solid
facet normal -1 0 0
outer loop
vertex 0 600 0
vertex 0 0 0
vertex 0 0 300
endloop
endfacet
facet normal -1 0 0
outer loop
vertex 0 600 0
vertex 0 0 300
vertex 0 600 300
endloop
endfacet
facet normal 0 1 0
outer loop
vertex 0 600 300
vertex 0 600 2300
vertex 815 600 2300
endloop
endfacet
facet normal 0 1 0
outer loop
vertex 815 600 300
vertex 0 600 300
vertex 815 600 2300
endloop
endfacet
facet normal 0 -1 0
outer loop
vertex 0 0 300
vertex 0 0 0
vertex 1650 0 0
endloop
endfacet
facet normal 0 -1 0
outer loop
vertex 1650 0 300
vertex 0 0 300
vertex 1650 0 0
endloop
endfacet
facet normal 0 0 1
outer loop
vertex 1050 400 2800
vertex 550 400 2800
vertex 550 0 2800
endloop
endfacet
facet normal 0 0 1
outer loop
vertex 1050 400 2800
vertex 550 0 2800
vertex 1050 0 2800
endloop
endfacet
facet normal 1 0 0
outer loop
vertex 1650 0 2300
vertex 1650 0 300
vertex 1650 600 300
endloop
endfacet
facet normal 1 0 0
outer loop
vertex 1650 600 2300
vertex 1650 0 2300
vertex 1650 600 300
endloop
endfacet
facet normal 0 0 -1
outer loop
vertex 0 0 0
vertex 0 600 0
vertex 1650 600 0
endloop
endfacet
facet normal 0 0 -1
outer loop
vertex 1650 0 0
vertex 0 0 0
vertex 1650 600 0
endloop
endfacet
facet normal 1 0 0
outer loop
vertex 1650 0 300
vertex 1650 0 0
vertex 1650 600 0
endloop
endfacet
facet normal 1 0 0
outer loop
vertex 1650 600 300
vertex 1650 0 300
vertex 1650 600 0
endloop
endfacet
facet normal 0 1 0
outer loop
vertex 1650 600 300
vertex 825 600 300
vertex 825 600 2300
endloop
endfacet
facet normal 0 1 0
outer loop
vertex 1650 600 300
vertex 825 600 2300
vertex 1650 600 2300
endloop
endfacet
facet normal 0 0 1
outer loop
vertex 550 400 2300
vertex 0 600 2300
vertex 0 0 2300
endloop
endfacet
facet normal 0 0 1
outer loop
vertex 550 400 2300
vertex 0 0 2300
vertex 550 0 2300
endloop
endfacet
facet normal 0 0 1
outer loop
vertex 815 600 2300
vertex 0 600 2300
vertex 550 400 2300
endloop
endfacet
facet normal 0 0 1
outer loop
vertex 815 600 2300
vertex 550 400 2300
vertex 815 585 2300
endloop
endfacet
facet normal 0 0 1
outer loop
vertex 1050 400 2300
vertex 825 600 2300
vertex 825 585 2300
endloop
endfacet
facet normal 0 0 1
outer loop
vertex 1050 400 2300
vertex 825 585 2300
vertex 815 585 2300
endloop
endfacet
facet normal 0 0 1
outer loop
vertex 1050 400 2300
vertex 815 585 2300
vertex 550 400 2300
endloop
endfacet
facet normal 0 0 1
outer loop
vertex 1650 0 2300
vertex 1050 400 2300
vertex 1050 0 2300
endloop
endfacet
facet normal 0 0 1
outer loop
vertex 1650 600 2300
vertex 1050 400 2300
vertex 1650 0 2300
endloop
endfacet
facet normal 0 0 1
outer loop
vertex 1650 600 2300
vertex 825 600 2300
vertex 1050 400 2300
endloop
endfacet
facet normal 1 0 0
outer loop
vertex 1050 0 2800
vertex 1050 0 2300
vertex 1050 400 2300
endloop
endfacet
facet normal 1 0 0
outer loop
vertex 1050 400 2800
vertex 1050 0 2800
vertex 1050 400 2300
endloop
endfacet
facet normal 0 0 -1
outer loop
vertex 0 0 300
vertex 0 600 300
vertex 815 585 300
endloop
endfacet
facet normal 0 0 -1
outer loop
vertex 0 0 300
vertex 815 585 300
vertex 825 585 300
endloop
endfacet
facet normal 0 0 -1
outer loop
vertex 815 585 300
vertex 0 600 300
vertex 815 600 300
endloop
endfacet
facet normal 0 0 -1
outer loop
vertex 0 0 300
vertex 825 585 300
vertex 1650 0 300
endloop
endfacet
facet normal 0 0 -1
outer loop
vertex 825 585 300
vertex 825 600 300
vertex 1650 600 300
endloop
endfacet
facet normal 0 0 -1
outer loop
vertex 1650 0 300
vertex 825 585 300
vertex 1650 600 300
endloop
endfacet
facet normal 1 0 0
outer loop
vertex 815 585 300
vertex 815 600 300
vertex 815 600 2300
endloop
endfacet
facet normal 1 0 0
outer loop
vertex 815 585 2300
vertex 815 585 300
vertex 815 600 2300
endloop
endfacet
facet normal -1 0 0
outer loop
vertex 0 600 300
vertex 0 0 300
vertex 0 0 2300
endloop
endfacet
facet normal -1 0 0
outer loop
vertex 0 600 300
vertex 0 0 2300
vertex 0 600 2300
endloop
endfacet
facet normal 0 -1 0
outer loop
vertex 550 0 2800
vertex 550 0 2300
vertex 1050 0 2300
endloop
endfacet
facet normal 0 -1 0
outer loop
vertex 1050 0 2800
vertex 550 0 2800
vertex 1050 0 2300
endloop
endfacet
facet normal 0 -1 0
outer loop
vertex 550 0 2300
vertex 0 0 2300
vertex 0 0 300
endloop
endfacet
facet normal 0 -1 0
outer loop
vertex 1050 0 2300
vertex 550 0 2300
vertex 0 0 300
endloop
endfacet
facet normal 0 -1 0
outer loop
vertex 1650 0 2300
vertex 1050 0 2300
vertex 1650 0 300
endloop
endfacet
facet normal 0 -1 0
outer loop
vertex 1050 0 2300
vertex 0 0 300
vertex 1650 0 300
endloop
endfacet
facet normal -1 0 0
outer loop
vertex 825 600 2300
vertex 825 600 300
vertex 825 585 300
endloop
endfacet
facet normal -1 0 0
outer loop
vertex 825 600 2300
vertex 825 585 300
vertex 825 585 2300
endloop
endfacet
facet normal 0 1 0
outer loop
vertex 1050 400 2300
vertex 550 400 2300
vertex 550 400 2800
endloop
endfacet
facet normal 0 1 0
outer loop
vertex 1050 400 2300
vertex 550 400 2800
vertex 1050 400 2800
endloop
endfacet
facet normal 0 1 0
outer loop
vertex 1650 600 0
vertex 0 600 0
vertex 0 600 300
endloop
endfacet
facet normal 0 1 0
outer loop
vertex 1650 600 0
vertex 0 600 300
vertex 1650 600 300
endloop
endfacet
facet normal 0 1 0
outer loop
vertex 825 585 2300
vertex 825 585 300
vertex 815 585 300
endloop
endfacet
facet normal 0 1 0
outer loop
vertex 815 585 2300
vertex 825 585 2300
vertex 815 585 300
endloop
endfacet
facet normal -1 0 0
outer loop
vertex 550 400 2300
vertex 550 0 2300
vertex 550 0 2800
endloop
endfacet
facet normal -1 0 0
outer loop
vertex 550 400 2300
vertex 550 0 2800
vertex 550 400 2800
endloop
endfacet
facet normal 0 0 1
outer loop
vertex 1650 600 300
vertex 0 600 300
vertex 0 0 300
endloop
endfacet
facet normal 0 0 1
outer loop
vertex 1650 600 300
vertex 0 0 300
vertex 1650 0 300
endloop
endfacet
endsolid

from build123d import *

# Parameters (mm, degrees)
F0_W     = 1650
F0_H     = 600
F1_DEPTH = 300
F2_W     = 1650
F2_H     = 600
F3_DEPTH = 2000
F4_W     = 10
F4_H     = 2000
F5_DEPTH = 15
F6_W     = 500
F6_H     = 400
F7_DEPTH = 500


with BuildPart() as f1:
    # F0 (on Top) → F1 (new body)
    with BuildSketch(Plane.XY):
        with Locations((825, 300)):
            Rectangle(F0_W, F0_H)
    extrude(amount=F1_DEPTH)


with BuildPart() as f3:
    # F2 (on face) → F3 (new body)
    with BuildSketch(Plane.XY.offset(300)):
        with Locations((825, 300)):
            Rectangle(F2_W, F2_H)
    extrude(amount=F3_DEPTH)

    # F4 (on face) → F5 (cut)
    with BuildSketch(Plane(origin=(0, 600, 0), x_dir=(-1, 0, 0), z_dir=(0, 1, 0))):
        with Locations((-820, 1300)):
            Rectangle(F4_W, F4_H)
    extrude(amount=-F5_DEPTH, mode=Mode.SUBTRACT)

    # F6 (on face) → F7 (join)
    with BuildSketch(Plane.XY.offset(2300)):
        with Locations((800, 200)):
            Rectangle(F6_W, F6_H)
    extrude(amount=F7_DEPTH)


solid = Compound([f1.part, f3.part])
